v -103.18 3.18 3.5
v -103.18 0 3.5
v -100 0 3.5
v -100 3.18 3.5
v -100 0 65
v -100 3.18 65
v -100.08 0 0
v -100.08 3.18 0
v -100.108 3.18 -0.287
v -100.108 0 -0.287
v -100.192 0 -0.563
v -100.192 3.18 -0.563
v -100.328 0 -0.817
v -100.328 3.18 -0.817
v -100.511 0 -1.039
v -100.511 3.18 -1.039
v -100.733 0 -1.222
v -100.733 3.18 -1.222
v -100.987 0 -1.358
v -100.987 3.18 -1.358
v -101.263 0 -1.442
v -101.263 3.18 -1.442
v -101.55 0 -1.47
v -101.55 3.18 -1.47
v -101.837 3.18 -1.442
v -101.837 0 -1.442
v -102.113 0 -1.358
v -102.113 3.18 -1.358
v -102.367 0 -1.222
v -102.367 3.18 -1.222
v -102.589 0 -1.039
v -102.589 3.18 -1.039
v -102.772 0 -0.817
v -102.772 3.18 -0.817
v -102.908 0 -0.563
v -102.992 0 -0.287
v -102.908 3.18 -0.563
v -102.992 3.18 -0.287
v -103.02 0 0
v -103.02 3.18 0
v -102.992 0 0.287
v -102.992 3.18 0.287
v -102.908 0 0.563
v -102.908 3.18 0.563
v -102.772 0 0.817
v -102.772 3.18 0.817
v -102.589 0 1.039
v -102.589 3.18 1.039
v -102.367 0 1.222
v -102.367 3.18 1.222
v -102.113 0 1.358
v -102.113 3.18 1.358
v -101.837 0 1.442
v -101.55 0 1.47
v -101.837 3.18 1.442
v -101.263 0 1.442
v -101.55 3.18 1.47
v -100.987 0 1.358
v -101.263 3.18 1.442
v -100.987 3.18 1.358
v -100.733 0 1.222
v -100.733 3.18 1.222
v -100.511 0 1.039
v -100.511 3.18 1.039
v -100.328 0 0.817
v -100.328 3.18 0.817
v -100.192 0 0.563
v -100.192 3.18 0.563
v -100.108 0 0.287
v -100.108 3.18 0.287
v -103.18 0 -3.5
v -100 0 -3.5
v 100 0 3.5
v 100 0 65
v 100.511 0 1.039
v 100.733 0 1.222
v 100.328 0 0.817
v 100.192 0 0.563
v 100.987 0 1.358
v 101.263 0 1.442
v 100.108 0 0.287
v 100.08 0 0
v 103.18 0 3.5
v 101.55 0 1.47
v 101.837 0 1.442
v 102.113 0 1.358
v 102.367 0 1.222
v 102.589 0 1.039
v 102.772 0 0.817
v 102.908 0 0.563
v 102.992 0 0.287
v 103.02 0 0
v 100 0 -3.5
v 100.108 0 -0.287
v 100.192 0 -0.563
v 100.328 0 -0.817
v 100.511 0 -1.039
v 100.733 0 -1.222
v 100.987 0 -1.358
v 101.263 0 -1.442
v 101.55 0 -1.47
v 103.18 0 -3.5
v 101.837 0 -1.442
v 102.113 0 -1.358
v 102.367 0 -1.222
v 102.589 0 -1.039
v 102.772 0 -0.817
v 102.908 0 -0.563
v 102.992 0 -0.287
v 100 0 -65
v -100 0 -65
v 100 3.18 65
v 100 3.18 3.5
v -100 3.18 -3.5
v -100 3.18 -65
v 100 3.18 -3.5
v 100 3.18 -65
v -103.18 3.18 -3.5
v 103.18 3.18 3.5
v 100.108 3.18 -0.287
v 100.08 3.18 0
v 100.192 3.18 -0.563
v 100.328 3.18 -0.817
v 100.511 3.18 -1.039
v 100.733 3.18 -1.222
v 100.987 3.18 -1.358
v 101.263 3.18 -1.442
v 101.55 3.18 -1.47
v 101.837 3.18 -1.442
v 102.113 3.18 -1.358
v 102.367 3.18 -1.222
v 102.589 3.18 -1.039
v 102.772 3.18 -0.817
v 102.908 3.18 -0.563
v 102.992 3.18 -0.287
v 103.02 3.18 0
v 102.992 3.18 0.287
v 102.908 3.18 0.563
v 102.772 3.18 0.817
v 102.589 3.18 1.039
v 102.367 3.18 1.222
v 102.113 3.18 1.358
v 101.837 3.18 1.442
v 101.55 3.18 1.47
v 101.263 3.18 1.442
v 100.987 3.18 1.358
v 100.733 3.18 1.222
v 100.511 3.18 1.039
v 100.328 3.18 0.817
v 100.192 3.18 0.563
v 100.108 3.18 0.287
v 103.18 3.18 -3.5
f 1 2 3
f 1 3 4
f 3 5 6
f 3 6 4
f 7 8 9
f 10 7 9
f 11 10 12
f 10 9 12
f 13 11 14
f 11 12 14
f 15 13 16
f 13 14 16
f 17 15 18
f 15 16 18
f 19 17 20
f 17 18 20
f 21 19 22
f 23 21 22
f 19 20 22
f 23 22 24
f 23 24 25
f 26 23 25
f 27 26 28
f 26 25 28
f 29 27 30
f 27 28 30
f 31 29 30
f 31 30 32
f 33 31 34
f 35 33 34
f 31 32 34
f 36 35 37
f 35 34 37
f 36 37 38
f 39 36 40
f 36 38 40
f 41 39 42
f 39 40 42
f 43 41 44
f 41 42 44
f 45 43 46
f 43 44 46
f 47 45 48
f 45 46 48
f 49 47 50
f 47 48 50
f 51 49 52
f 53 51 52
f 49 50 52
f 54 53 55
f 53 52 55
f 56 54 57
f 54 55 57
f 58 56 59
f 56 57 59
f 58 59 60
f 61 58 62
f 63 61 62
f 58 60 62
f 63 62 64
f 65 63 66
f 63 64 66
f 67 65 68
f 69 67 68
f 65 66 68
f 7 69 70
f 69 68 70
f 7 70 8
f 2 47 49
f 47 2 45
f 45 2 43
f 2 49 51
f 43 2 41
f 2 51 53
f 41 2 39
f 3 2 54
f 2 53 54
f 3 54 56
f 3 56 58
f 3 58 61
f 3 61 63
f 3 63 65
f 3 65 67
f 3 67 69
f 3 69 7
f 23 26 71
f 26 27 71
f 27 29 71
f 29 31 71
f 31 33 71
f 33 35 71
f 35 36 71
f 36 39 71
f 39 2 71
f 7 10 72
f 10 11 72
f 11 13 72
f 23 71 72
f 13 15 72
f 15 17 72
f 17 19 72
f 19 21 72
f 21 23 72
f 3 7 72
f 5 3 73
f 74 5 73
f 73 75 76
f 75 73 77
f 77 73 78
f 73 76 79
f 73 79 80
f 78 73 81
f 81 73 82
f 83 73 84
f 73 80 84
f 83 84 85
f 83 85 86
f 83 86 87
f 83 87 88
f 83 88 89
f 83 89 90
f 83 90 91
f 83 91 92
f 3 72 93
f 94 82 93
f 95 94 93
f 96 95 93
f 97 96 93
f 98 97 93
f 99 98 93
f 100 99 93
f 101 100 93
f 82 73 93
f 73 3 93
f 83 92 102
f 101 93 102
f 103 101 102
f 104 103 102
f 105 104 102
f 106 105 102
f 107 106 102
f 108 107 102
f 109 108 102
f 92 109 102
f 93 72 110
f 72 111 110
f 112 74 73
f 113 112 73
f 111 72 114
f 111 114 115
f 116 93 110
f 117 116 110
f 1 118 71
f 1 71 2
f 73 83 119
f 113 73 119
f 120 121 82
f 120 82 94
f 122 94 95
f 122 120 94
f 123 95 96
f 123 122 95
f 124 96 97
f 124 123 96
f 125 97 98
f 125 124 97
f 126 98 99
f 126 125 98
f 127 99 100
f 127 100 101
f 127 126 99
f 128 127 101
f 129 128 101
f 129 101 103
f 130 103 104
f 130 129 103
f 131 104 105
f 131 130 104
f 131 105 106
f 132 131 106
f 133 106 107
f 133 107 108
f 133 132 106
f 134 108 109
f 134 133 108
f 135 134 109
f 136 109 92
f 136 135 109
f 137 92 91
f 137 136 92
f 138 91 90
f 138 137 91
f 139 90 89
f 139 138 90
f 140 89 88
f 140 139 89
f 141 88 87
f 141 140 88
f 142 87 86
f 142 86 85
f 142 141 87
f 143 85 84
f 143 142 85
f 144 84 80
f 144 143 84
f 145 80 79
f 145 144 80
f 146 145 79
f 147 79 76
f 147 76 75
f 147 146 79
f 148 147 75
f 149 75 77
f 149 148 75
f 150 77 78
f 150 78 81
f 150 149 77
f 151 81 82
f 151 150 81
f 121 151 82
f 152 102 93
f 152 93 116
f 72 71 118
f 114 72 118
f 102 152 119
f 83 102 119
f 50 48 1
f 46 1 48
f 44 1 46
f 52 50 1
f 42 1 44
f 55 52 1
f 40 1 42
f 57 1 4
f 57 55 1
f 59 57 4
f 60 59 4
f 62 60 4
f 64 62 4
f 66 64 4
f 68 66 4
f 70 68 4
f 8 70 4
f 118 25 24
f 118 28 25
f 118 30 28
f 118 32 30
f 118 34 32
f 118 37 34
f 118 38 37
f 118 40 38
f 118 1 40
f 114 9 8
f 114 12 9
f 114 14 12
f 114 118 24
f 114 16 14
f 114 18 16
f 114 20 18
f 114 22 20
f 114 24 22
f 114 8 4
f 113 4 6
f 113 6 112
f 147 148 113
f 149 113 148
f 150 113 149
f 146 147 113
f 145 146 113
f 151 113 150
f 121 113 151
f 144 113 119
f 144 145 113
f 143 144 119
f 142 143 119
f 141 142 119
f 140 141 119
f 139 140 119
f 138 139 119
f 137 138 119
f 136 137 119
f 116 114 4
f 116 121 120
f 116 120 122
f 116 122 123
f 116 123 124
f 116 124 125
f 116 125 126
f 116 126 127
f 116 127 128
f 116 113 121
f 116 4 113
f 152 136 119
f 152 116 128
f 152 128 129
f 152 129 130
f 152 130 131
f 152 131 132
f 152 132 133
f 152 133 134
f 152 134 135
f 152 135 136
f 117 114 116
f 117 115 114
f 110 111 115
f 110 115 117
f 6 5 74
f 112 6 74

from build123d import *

# Parameters (mm, degrees)
SKETCH2_W           = 200
SKETCH2_H           = 130
BOSS_EXTRUDE1_DEPTH = 3.18
SKETCH5_W           = 7
SKETCH5_H           = 3.18
BOSS_EXTRUDE2_DEPTH = 3.18
SKETCH11_R          = 1.47
CUT_EXTRUDE5_DEPTH  = 3.18


with BuildPart() as part:
    # Sketch2 → Boss-Extrude1 (new body)
    with BuildSketch(Plane(origin=(0, 0, 0), x_dir=(1, 0, 0), z_dir=(0, 1, 0))):
        Rectangle(SKETCH2_W, SKETCH2_H)
    extrude(amount=BOSS_EXTRUDE1_DEPTH)

    # Sketch5 → Boss-Extrude2 (add)
    with BuildSketch(Plane.ZY.offset(100)):
        with Locations((0, 1.59)):
            Rectangle(SKETCH5_W, SKETCH5_H)
    boss_extrude2 = extrude(amount=BOSS_EXTRUDE2_DEPTH)

    # Sketch11 → Cut-Extrude5 (cut)
    with BuildSketch(Plane(origin=(0, 3.18, 0), x_dir=(1, 0, 0), z_dir=(0, 1, 0))):
        with Locations((-101.55, 0)):
            Circle(SKETCH11_R)
    cut_extrude5 = extrude(amount=-CUT_EXTRUDE5_DEPTH, mode=Mode.SUBTRACT)

    # Mirror1: Boss-Extrude2, Cut-Extrude5 across plane
    add(boss_extrude2.mirror(Plane(origin=(0, 0, 0), x_dir=(0, 0, 1), z_dir=(1, 0, 0))))
    add(cut_extrude5.mirror(Plane(origin=(0, 0, 0), x_dir=(0, 0, 1), z_dir=(1, 0, 0))), mode=Mode.SUBTRACT)


solid = part.part
